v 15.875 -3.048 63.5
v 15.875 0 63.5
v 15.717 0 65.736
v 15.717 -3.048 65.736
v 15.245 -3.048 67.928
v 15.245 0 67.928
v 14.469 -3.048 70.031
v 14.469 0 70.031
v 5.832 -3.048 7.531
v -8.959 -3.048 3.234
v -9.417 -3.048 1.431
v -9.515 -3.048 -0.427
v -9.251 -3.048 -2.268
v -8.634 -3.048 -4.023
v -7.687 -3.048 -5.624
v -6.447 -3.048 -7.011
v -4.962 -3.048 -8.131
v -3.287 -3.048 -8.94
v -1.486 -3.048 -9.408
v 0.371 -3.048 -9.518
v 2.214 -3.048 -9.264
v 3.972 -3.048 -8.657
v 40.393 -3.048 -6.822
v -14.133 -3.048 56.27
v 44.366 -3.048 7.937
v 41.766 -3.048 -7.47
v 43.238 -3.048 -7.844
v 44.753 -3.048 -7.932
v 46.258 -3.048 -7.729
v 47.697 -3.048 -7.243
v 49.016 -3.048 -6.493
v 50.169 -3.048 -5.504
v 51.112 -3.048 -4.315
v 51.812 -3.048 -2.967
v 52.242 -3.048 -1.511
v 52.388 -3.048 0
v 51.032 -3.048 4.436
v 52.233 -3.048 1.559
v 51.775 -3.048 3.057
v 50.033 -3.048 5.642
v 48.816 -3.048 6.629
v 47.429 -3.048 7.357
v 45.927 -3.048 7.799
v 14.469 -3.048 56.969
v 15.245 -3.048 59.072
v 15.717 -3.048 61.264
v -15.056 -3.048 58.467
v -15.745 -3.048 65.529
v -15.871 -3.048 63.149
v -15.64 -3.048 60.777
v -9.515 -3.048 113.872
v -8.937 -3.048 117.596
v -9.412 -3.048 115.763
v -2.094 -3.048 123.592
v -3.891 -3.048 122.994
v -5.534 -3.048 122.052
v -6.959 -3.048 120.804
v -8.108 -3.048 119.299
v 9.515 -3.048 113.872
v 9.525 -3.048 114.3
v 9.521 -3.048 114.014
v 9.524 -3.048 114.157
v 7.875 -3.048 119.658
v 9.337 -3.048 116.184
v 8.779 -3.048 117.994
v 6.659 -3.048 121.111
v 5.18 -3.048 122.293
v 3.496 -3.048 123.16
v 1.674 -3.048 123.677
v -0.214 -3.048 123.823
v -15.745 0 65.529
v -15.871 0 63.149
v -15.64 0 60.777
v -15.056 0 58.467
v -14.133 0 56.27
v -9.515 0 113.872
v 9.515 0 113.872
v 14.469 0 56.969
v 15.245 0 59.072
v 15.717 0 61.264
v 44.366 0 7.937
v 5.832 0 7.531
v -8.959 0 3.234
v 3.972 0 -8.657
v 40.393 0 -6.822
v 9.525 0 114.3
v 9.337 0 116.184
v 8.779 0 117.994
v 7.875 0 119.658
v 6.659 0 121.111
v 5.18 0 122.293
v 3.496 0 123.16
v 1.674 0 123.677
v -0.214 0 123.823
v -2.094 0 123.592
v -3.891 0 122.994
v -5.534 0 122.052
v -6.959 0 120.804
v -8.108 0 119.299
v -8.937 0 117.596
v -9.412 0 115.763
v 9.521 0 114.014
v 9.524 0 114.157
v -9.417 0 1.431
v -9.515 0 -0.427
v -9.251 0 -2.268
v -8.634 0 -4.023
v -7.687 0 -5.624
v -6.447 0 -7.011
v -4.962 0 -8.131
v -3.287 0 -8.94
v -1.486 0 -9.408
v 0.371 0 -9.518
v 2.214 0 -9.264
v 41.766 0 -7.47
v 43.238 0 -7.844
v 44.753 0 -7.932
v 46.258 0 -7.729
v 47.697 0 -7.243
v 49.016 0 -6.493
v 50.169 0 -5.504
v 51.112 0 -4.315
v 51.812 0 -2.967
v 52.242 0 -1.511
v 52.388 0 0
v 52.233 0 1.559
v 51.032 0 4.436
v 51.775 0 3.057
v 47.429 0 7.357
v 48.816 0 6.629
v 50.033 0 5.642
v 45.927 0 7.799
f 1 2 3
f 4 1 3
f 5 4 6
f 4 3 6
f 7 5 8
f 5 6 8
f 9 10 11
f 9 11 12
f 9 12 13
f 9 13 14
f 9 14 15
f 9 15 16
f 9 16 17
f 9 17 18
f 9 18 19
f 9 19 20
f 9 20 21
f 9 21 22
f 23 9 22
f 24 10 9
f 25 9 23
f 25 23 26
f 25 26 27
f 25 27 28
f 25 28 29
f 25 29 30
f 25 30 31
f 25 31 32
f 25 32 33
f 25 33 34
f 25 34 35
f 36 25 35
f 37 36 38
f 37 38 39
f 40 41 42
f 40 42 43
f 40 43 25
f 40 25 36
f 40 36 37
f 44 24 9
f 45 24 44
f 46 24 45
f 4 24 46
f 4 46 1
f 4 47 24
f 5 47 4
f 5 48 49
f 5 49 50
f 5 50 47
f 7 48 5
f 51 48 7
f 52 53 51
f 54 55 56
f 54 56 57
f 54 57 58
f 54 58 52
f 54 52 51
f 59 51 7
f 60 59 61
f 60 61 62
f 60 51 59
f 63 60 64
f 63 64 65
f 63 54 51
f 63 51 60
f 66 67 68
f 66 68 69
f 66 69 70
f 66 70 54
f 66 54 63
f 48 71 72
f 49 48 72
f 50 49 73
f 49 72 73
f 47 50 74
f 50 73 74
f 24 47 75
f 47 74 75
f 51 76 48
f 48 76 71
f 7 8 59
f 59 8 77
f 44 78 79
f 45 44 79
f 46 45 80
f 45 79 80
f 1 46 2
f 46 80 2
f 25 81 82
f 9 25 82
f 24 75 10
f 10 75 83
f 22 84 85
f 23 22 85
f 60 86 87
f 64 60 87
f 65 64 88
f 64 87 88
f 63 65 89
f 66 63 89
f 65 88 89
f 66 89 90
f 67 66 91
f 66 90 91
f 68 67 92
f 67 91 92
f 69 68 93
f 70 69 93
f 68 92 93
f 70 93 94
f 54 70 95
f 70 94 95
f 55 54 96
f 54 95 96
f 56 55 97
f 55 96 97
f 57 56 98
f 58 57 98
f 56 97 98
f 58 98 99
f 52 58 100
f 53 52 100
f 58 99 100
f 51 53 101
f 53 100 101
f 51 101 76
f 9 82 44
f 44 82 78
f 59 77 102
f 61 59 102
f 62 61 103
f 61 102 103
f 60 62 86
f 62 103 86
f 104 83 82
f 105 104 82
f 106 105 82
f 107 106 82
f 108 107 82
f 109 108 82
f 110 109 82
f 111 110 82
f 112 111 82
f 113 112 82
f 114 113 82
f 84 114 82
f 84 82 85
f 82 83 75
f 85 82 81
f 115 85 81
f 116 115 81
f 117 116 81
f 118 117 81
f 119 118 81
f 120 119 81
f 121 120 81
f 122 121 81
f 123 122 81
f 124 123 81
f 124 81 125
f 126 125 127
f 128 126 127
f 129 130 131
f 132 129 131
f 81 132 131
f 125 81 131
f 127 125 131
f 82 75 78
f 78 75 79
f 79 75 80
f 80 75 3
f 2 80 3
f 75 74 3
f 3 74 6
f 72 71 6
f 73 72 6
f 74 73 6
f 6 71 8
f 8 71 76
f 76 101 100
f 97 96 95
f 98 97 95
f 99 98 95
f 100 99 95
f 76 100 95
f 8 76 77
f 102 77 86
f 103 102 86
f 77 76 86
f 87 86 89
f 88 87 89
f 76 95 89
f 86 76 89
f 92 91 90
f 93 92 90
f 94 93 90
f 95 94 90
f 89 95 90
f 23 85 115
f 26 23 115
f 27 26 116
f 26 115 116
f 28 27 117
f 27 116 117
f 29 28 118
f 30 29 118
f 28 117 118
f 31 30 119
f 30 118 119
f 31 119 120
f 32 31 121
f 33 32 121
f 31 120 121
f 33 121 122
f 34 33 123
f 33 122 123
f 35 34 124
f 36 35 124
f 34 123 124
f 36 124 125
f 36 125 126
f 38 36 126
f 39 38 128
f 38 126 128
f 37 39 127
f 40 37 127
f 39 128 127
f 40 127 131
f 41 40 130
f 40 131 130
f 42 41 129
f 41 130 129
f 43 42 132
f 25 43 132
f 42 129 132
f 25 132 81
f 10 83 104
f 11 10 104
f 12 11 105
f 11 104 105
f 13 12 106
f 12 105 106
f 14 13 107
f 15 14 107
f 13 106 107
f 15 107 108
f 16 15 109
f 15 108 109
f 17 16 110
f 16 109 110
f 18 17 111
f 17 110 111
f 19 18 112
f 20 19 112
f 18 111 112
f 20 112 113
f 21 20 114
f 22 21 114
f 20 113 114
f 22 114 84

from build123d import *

# Parameters (mm, degrees)
F1_DEPTH = 3.048


with BuildPart() as f1:
    # F0 (on Front) → F1 (new body)
    with BuildSketch(Plane.XZ):
        with BuildLine():
            Line((9.525, 0), (0, 0))
            Line((0, 0), (0, 9.525))
            ThreePointArc((0, 9.525), (-5.473729162, 7.7951211704), (-8.95924033, 3.2338270994))
            ThreePointArc((-8.95924033, 3.2338270994), (-6.4472498387, -7.0113190283), (3.9721601425, -8.657226392))
            ThreePointArc((3.9721601425, -8.657226392), (8.0174949441, -5.1425090978), (9.525, 0))
        make_face()
        with BuildLine():
            Line((0, 9.525), (0, 0))
            Line((0, 0), (9.525, 0))
            ThreePointArc((9.525, 0), (8.5520017953, 4.1939110974), (5.8317946892, 7.5309890255))
            ThreePointArc((5.8317946892, 7.5309890255), (3.0816354856, 9.0127214388), (0, 9.525))
        make_face()
        with BuildLine():
            ThreePointArc((-8.95924033, 3.2338270994), (-5.473729162, 7.7951211704), (0, 9.525))
            Line((0, 9.525), (0, 47.625))
            ThreePointArc((0, 47.625), (-8.2836905365, 49.957618522), (-14.1330264303, 56.2699800194))
            Line((-14.1330264303, 56.2699800194), (-8.95924033, 3.2338270994))
        make_face()
        with BuildLine():
            Line((0, 47.625), (0, 9.525))
            ThreePointArc((0, 9.525), (3.0816354856, 9.0127214388), (5.8317946892, 7.5309890255))
            Line((5.8317946892, 7.5309890255), (14.4691487973, 56.9685868235))
            ThreePointArc((14.4691487973, 56.9685868235), (8.6118941245, 50.1639246932), (0, 47.625))
        make_face()
        with BuildLine():
            Line((36.5125, 0), (9.525, 0))
            ThreePointArc((9.525, 0), (8.0174949441, -5.1425090978), (3.9721601425, -8.657226392))
            Line((3.9721601425, -8.657226392), (40.3929904428, -6.8223588078))
            ThreePointArc((40.3929904428, -6.8223588078), (37.5504920607, -3.9243721084), (36.5125, 0))
        make_face()
        with BuildLine():
            ThreePointArc((5.8317946892, 7.5309890255), (8.5520017953, 4.1939110974), (9.525, 0))
            Line((9.525, 0), (36.5125, 0))
            ThreePointArc((36.5125, 0), (38.8078464582, 5.5830108061), (44.366360702, 7.9370593243))
            Line((44.366360702, 7.9370593243), (5.8317946892, 7.5309890255))
        make_face()
        with BuildLine():
            ThreePointArc((-14.1330264303, 56.2699800194), (-8.2836905365, 49.957618522), (0, 47.625))
            Line((0, 47.625), (0, 63.5))
            Line((0, 63.5), (0, 79.375))
            ThreePointArc((0, 79.375), (-10.4834895471, 75.4210767935), (-15.7448168762, 65.528883076))
            ThreePointArc((-15.7448168762, 65.528883076), (-15.6397954467, 60.7774233922), (-14.1330264303, 56.2699800194))
        make_face()
        with BuildLine():
            Line((0, 63.5), (0, 47.625))
            ThreePointArc((0, 47.625), (8.6118941245, 50.1639246932), (14.4691487973, 56.9685868235))
            ThreePointArc((14.4691487973, 56.9685868235), (15.5195580181, 60.1594994505), (15.875, 63.5))
            ThreePointArc((15.875, 63.5), (15.5195580181, 66.8405005495), (14.4691487973, 70.0314131765))
            ThreePointArc((14.4691487973, 70.0314131765), (8.6118941245, 76.8360753068), (0, 79.375))
            Line((0, 79.375), (0, 63.5))
        make_face()
        with BuildLine():
            ThreePointArc((44.366360702, 7.9370593243), (38.8078464582, 5.5830108061), (36.5125, 0))
            ThreePointArc((36.5125, 0), (37.5504920607, -3.9243721084), (40.3929904428, -6.8223588078))
            ThreePointArc((40.3929904428, -6.8223588078), (48.3743721084, -6.8995079393), (52.3875, 0))
            ThreePointArc((52.3875, 0), (50.0330108061, 5.6421535418), (44.366360702, 7.9370593243))
        make_face()
        with BuildLine():
            Line((0, 104.775), (0, 79.375))
            ThreePointArc((0, 79.375), (8.6118941245, 76.8360753068), (14.4691487973, 70.0314131765))
            Line((14.4691487973, 70.0314131765), (9.5153598494, 113.8715703832))
            ThreePointArc((9.5153598494, 113.8715703832), (6.581976637, 107.4150011946), (0, 104.775))
        make_face()
        with BuildLine():
            ThreePointArc((-15.7448168762, 65.528883076), (-10.4834895471, 75.4210767935), (0, 79.375))
            Line((0, 79.375), (0, 104.775))
            ThreePointArc((0, 104.775), (-6.581976637, 107.4150011946), (-9.5153598494, 113.8715703832))
            Line((-9.5153598494, 113.8715703832), (-15.7448168762, 65.528883076))
        make_face()
        with BuildLine():
            ThreePointArc((-9.5153598494, 113.8715703832), (-6.581976637, 107.4150011946), (0, 104.775))
            ThreePointArc((0, 104.775), (6.581976637, 107.4150011946), (9.5153598494, 113.8715703832))
            ThreePointArc((9.5153598494, 113.8715703832), (9.5225896574, 114.0857309699), (9.525, 114.3))
            ThreePointArc((9.525, 114.3), (-0.2142690301, 123.8225896574), (-9.5153598494, 113.8715703832))
        make_face()
    extrude(amount=F1_DEPTH)


solid = f1.part
